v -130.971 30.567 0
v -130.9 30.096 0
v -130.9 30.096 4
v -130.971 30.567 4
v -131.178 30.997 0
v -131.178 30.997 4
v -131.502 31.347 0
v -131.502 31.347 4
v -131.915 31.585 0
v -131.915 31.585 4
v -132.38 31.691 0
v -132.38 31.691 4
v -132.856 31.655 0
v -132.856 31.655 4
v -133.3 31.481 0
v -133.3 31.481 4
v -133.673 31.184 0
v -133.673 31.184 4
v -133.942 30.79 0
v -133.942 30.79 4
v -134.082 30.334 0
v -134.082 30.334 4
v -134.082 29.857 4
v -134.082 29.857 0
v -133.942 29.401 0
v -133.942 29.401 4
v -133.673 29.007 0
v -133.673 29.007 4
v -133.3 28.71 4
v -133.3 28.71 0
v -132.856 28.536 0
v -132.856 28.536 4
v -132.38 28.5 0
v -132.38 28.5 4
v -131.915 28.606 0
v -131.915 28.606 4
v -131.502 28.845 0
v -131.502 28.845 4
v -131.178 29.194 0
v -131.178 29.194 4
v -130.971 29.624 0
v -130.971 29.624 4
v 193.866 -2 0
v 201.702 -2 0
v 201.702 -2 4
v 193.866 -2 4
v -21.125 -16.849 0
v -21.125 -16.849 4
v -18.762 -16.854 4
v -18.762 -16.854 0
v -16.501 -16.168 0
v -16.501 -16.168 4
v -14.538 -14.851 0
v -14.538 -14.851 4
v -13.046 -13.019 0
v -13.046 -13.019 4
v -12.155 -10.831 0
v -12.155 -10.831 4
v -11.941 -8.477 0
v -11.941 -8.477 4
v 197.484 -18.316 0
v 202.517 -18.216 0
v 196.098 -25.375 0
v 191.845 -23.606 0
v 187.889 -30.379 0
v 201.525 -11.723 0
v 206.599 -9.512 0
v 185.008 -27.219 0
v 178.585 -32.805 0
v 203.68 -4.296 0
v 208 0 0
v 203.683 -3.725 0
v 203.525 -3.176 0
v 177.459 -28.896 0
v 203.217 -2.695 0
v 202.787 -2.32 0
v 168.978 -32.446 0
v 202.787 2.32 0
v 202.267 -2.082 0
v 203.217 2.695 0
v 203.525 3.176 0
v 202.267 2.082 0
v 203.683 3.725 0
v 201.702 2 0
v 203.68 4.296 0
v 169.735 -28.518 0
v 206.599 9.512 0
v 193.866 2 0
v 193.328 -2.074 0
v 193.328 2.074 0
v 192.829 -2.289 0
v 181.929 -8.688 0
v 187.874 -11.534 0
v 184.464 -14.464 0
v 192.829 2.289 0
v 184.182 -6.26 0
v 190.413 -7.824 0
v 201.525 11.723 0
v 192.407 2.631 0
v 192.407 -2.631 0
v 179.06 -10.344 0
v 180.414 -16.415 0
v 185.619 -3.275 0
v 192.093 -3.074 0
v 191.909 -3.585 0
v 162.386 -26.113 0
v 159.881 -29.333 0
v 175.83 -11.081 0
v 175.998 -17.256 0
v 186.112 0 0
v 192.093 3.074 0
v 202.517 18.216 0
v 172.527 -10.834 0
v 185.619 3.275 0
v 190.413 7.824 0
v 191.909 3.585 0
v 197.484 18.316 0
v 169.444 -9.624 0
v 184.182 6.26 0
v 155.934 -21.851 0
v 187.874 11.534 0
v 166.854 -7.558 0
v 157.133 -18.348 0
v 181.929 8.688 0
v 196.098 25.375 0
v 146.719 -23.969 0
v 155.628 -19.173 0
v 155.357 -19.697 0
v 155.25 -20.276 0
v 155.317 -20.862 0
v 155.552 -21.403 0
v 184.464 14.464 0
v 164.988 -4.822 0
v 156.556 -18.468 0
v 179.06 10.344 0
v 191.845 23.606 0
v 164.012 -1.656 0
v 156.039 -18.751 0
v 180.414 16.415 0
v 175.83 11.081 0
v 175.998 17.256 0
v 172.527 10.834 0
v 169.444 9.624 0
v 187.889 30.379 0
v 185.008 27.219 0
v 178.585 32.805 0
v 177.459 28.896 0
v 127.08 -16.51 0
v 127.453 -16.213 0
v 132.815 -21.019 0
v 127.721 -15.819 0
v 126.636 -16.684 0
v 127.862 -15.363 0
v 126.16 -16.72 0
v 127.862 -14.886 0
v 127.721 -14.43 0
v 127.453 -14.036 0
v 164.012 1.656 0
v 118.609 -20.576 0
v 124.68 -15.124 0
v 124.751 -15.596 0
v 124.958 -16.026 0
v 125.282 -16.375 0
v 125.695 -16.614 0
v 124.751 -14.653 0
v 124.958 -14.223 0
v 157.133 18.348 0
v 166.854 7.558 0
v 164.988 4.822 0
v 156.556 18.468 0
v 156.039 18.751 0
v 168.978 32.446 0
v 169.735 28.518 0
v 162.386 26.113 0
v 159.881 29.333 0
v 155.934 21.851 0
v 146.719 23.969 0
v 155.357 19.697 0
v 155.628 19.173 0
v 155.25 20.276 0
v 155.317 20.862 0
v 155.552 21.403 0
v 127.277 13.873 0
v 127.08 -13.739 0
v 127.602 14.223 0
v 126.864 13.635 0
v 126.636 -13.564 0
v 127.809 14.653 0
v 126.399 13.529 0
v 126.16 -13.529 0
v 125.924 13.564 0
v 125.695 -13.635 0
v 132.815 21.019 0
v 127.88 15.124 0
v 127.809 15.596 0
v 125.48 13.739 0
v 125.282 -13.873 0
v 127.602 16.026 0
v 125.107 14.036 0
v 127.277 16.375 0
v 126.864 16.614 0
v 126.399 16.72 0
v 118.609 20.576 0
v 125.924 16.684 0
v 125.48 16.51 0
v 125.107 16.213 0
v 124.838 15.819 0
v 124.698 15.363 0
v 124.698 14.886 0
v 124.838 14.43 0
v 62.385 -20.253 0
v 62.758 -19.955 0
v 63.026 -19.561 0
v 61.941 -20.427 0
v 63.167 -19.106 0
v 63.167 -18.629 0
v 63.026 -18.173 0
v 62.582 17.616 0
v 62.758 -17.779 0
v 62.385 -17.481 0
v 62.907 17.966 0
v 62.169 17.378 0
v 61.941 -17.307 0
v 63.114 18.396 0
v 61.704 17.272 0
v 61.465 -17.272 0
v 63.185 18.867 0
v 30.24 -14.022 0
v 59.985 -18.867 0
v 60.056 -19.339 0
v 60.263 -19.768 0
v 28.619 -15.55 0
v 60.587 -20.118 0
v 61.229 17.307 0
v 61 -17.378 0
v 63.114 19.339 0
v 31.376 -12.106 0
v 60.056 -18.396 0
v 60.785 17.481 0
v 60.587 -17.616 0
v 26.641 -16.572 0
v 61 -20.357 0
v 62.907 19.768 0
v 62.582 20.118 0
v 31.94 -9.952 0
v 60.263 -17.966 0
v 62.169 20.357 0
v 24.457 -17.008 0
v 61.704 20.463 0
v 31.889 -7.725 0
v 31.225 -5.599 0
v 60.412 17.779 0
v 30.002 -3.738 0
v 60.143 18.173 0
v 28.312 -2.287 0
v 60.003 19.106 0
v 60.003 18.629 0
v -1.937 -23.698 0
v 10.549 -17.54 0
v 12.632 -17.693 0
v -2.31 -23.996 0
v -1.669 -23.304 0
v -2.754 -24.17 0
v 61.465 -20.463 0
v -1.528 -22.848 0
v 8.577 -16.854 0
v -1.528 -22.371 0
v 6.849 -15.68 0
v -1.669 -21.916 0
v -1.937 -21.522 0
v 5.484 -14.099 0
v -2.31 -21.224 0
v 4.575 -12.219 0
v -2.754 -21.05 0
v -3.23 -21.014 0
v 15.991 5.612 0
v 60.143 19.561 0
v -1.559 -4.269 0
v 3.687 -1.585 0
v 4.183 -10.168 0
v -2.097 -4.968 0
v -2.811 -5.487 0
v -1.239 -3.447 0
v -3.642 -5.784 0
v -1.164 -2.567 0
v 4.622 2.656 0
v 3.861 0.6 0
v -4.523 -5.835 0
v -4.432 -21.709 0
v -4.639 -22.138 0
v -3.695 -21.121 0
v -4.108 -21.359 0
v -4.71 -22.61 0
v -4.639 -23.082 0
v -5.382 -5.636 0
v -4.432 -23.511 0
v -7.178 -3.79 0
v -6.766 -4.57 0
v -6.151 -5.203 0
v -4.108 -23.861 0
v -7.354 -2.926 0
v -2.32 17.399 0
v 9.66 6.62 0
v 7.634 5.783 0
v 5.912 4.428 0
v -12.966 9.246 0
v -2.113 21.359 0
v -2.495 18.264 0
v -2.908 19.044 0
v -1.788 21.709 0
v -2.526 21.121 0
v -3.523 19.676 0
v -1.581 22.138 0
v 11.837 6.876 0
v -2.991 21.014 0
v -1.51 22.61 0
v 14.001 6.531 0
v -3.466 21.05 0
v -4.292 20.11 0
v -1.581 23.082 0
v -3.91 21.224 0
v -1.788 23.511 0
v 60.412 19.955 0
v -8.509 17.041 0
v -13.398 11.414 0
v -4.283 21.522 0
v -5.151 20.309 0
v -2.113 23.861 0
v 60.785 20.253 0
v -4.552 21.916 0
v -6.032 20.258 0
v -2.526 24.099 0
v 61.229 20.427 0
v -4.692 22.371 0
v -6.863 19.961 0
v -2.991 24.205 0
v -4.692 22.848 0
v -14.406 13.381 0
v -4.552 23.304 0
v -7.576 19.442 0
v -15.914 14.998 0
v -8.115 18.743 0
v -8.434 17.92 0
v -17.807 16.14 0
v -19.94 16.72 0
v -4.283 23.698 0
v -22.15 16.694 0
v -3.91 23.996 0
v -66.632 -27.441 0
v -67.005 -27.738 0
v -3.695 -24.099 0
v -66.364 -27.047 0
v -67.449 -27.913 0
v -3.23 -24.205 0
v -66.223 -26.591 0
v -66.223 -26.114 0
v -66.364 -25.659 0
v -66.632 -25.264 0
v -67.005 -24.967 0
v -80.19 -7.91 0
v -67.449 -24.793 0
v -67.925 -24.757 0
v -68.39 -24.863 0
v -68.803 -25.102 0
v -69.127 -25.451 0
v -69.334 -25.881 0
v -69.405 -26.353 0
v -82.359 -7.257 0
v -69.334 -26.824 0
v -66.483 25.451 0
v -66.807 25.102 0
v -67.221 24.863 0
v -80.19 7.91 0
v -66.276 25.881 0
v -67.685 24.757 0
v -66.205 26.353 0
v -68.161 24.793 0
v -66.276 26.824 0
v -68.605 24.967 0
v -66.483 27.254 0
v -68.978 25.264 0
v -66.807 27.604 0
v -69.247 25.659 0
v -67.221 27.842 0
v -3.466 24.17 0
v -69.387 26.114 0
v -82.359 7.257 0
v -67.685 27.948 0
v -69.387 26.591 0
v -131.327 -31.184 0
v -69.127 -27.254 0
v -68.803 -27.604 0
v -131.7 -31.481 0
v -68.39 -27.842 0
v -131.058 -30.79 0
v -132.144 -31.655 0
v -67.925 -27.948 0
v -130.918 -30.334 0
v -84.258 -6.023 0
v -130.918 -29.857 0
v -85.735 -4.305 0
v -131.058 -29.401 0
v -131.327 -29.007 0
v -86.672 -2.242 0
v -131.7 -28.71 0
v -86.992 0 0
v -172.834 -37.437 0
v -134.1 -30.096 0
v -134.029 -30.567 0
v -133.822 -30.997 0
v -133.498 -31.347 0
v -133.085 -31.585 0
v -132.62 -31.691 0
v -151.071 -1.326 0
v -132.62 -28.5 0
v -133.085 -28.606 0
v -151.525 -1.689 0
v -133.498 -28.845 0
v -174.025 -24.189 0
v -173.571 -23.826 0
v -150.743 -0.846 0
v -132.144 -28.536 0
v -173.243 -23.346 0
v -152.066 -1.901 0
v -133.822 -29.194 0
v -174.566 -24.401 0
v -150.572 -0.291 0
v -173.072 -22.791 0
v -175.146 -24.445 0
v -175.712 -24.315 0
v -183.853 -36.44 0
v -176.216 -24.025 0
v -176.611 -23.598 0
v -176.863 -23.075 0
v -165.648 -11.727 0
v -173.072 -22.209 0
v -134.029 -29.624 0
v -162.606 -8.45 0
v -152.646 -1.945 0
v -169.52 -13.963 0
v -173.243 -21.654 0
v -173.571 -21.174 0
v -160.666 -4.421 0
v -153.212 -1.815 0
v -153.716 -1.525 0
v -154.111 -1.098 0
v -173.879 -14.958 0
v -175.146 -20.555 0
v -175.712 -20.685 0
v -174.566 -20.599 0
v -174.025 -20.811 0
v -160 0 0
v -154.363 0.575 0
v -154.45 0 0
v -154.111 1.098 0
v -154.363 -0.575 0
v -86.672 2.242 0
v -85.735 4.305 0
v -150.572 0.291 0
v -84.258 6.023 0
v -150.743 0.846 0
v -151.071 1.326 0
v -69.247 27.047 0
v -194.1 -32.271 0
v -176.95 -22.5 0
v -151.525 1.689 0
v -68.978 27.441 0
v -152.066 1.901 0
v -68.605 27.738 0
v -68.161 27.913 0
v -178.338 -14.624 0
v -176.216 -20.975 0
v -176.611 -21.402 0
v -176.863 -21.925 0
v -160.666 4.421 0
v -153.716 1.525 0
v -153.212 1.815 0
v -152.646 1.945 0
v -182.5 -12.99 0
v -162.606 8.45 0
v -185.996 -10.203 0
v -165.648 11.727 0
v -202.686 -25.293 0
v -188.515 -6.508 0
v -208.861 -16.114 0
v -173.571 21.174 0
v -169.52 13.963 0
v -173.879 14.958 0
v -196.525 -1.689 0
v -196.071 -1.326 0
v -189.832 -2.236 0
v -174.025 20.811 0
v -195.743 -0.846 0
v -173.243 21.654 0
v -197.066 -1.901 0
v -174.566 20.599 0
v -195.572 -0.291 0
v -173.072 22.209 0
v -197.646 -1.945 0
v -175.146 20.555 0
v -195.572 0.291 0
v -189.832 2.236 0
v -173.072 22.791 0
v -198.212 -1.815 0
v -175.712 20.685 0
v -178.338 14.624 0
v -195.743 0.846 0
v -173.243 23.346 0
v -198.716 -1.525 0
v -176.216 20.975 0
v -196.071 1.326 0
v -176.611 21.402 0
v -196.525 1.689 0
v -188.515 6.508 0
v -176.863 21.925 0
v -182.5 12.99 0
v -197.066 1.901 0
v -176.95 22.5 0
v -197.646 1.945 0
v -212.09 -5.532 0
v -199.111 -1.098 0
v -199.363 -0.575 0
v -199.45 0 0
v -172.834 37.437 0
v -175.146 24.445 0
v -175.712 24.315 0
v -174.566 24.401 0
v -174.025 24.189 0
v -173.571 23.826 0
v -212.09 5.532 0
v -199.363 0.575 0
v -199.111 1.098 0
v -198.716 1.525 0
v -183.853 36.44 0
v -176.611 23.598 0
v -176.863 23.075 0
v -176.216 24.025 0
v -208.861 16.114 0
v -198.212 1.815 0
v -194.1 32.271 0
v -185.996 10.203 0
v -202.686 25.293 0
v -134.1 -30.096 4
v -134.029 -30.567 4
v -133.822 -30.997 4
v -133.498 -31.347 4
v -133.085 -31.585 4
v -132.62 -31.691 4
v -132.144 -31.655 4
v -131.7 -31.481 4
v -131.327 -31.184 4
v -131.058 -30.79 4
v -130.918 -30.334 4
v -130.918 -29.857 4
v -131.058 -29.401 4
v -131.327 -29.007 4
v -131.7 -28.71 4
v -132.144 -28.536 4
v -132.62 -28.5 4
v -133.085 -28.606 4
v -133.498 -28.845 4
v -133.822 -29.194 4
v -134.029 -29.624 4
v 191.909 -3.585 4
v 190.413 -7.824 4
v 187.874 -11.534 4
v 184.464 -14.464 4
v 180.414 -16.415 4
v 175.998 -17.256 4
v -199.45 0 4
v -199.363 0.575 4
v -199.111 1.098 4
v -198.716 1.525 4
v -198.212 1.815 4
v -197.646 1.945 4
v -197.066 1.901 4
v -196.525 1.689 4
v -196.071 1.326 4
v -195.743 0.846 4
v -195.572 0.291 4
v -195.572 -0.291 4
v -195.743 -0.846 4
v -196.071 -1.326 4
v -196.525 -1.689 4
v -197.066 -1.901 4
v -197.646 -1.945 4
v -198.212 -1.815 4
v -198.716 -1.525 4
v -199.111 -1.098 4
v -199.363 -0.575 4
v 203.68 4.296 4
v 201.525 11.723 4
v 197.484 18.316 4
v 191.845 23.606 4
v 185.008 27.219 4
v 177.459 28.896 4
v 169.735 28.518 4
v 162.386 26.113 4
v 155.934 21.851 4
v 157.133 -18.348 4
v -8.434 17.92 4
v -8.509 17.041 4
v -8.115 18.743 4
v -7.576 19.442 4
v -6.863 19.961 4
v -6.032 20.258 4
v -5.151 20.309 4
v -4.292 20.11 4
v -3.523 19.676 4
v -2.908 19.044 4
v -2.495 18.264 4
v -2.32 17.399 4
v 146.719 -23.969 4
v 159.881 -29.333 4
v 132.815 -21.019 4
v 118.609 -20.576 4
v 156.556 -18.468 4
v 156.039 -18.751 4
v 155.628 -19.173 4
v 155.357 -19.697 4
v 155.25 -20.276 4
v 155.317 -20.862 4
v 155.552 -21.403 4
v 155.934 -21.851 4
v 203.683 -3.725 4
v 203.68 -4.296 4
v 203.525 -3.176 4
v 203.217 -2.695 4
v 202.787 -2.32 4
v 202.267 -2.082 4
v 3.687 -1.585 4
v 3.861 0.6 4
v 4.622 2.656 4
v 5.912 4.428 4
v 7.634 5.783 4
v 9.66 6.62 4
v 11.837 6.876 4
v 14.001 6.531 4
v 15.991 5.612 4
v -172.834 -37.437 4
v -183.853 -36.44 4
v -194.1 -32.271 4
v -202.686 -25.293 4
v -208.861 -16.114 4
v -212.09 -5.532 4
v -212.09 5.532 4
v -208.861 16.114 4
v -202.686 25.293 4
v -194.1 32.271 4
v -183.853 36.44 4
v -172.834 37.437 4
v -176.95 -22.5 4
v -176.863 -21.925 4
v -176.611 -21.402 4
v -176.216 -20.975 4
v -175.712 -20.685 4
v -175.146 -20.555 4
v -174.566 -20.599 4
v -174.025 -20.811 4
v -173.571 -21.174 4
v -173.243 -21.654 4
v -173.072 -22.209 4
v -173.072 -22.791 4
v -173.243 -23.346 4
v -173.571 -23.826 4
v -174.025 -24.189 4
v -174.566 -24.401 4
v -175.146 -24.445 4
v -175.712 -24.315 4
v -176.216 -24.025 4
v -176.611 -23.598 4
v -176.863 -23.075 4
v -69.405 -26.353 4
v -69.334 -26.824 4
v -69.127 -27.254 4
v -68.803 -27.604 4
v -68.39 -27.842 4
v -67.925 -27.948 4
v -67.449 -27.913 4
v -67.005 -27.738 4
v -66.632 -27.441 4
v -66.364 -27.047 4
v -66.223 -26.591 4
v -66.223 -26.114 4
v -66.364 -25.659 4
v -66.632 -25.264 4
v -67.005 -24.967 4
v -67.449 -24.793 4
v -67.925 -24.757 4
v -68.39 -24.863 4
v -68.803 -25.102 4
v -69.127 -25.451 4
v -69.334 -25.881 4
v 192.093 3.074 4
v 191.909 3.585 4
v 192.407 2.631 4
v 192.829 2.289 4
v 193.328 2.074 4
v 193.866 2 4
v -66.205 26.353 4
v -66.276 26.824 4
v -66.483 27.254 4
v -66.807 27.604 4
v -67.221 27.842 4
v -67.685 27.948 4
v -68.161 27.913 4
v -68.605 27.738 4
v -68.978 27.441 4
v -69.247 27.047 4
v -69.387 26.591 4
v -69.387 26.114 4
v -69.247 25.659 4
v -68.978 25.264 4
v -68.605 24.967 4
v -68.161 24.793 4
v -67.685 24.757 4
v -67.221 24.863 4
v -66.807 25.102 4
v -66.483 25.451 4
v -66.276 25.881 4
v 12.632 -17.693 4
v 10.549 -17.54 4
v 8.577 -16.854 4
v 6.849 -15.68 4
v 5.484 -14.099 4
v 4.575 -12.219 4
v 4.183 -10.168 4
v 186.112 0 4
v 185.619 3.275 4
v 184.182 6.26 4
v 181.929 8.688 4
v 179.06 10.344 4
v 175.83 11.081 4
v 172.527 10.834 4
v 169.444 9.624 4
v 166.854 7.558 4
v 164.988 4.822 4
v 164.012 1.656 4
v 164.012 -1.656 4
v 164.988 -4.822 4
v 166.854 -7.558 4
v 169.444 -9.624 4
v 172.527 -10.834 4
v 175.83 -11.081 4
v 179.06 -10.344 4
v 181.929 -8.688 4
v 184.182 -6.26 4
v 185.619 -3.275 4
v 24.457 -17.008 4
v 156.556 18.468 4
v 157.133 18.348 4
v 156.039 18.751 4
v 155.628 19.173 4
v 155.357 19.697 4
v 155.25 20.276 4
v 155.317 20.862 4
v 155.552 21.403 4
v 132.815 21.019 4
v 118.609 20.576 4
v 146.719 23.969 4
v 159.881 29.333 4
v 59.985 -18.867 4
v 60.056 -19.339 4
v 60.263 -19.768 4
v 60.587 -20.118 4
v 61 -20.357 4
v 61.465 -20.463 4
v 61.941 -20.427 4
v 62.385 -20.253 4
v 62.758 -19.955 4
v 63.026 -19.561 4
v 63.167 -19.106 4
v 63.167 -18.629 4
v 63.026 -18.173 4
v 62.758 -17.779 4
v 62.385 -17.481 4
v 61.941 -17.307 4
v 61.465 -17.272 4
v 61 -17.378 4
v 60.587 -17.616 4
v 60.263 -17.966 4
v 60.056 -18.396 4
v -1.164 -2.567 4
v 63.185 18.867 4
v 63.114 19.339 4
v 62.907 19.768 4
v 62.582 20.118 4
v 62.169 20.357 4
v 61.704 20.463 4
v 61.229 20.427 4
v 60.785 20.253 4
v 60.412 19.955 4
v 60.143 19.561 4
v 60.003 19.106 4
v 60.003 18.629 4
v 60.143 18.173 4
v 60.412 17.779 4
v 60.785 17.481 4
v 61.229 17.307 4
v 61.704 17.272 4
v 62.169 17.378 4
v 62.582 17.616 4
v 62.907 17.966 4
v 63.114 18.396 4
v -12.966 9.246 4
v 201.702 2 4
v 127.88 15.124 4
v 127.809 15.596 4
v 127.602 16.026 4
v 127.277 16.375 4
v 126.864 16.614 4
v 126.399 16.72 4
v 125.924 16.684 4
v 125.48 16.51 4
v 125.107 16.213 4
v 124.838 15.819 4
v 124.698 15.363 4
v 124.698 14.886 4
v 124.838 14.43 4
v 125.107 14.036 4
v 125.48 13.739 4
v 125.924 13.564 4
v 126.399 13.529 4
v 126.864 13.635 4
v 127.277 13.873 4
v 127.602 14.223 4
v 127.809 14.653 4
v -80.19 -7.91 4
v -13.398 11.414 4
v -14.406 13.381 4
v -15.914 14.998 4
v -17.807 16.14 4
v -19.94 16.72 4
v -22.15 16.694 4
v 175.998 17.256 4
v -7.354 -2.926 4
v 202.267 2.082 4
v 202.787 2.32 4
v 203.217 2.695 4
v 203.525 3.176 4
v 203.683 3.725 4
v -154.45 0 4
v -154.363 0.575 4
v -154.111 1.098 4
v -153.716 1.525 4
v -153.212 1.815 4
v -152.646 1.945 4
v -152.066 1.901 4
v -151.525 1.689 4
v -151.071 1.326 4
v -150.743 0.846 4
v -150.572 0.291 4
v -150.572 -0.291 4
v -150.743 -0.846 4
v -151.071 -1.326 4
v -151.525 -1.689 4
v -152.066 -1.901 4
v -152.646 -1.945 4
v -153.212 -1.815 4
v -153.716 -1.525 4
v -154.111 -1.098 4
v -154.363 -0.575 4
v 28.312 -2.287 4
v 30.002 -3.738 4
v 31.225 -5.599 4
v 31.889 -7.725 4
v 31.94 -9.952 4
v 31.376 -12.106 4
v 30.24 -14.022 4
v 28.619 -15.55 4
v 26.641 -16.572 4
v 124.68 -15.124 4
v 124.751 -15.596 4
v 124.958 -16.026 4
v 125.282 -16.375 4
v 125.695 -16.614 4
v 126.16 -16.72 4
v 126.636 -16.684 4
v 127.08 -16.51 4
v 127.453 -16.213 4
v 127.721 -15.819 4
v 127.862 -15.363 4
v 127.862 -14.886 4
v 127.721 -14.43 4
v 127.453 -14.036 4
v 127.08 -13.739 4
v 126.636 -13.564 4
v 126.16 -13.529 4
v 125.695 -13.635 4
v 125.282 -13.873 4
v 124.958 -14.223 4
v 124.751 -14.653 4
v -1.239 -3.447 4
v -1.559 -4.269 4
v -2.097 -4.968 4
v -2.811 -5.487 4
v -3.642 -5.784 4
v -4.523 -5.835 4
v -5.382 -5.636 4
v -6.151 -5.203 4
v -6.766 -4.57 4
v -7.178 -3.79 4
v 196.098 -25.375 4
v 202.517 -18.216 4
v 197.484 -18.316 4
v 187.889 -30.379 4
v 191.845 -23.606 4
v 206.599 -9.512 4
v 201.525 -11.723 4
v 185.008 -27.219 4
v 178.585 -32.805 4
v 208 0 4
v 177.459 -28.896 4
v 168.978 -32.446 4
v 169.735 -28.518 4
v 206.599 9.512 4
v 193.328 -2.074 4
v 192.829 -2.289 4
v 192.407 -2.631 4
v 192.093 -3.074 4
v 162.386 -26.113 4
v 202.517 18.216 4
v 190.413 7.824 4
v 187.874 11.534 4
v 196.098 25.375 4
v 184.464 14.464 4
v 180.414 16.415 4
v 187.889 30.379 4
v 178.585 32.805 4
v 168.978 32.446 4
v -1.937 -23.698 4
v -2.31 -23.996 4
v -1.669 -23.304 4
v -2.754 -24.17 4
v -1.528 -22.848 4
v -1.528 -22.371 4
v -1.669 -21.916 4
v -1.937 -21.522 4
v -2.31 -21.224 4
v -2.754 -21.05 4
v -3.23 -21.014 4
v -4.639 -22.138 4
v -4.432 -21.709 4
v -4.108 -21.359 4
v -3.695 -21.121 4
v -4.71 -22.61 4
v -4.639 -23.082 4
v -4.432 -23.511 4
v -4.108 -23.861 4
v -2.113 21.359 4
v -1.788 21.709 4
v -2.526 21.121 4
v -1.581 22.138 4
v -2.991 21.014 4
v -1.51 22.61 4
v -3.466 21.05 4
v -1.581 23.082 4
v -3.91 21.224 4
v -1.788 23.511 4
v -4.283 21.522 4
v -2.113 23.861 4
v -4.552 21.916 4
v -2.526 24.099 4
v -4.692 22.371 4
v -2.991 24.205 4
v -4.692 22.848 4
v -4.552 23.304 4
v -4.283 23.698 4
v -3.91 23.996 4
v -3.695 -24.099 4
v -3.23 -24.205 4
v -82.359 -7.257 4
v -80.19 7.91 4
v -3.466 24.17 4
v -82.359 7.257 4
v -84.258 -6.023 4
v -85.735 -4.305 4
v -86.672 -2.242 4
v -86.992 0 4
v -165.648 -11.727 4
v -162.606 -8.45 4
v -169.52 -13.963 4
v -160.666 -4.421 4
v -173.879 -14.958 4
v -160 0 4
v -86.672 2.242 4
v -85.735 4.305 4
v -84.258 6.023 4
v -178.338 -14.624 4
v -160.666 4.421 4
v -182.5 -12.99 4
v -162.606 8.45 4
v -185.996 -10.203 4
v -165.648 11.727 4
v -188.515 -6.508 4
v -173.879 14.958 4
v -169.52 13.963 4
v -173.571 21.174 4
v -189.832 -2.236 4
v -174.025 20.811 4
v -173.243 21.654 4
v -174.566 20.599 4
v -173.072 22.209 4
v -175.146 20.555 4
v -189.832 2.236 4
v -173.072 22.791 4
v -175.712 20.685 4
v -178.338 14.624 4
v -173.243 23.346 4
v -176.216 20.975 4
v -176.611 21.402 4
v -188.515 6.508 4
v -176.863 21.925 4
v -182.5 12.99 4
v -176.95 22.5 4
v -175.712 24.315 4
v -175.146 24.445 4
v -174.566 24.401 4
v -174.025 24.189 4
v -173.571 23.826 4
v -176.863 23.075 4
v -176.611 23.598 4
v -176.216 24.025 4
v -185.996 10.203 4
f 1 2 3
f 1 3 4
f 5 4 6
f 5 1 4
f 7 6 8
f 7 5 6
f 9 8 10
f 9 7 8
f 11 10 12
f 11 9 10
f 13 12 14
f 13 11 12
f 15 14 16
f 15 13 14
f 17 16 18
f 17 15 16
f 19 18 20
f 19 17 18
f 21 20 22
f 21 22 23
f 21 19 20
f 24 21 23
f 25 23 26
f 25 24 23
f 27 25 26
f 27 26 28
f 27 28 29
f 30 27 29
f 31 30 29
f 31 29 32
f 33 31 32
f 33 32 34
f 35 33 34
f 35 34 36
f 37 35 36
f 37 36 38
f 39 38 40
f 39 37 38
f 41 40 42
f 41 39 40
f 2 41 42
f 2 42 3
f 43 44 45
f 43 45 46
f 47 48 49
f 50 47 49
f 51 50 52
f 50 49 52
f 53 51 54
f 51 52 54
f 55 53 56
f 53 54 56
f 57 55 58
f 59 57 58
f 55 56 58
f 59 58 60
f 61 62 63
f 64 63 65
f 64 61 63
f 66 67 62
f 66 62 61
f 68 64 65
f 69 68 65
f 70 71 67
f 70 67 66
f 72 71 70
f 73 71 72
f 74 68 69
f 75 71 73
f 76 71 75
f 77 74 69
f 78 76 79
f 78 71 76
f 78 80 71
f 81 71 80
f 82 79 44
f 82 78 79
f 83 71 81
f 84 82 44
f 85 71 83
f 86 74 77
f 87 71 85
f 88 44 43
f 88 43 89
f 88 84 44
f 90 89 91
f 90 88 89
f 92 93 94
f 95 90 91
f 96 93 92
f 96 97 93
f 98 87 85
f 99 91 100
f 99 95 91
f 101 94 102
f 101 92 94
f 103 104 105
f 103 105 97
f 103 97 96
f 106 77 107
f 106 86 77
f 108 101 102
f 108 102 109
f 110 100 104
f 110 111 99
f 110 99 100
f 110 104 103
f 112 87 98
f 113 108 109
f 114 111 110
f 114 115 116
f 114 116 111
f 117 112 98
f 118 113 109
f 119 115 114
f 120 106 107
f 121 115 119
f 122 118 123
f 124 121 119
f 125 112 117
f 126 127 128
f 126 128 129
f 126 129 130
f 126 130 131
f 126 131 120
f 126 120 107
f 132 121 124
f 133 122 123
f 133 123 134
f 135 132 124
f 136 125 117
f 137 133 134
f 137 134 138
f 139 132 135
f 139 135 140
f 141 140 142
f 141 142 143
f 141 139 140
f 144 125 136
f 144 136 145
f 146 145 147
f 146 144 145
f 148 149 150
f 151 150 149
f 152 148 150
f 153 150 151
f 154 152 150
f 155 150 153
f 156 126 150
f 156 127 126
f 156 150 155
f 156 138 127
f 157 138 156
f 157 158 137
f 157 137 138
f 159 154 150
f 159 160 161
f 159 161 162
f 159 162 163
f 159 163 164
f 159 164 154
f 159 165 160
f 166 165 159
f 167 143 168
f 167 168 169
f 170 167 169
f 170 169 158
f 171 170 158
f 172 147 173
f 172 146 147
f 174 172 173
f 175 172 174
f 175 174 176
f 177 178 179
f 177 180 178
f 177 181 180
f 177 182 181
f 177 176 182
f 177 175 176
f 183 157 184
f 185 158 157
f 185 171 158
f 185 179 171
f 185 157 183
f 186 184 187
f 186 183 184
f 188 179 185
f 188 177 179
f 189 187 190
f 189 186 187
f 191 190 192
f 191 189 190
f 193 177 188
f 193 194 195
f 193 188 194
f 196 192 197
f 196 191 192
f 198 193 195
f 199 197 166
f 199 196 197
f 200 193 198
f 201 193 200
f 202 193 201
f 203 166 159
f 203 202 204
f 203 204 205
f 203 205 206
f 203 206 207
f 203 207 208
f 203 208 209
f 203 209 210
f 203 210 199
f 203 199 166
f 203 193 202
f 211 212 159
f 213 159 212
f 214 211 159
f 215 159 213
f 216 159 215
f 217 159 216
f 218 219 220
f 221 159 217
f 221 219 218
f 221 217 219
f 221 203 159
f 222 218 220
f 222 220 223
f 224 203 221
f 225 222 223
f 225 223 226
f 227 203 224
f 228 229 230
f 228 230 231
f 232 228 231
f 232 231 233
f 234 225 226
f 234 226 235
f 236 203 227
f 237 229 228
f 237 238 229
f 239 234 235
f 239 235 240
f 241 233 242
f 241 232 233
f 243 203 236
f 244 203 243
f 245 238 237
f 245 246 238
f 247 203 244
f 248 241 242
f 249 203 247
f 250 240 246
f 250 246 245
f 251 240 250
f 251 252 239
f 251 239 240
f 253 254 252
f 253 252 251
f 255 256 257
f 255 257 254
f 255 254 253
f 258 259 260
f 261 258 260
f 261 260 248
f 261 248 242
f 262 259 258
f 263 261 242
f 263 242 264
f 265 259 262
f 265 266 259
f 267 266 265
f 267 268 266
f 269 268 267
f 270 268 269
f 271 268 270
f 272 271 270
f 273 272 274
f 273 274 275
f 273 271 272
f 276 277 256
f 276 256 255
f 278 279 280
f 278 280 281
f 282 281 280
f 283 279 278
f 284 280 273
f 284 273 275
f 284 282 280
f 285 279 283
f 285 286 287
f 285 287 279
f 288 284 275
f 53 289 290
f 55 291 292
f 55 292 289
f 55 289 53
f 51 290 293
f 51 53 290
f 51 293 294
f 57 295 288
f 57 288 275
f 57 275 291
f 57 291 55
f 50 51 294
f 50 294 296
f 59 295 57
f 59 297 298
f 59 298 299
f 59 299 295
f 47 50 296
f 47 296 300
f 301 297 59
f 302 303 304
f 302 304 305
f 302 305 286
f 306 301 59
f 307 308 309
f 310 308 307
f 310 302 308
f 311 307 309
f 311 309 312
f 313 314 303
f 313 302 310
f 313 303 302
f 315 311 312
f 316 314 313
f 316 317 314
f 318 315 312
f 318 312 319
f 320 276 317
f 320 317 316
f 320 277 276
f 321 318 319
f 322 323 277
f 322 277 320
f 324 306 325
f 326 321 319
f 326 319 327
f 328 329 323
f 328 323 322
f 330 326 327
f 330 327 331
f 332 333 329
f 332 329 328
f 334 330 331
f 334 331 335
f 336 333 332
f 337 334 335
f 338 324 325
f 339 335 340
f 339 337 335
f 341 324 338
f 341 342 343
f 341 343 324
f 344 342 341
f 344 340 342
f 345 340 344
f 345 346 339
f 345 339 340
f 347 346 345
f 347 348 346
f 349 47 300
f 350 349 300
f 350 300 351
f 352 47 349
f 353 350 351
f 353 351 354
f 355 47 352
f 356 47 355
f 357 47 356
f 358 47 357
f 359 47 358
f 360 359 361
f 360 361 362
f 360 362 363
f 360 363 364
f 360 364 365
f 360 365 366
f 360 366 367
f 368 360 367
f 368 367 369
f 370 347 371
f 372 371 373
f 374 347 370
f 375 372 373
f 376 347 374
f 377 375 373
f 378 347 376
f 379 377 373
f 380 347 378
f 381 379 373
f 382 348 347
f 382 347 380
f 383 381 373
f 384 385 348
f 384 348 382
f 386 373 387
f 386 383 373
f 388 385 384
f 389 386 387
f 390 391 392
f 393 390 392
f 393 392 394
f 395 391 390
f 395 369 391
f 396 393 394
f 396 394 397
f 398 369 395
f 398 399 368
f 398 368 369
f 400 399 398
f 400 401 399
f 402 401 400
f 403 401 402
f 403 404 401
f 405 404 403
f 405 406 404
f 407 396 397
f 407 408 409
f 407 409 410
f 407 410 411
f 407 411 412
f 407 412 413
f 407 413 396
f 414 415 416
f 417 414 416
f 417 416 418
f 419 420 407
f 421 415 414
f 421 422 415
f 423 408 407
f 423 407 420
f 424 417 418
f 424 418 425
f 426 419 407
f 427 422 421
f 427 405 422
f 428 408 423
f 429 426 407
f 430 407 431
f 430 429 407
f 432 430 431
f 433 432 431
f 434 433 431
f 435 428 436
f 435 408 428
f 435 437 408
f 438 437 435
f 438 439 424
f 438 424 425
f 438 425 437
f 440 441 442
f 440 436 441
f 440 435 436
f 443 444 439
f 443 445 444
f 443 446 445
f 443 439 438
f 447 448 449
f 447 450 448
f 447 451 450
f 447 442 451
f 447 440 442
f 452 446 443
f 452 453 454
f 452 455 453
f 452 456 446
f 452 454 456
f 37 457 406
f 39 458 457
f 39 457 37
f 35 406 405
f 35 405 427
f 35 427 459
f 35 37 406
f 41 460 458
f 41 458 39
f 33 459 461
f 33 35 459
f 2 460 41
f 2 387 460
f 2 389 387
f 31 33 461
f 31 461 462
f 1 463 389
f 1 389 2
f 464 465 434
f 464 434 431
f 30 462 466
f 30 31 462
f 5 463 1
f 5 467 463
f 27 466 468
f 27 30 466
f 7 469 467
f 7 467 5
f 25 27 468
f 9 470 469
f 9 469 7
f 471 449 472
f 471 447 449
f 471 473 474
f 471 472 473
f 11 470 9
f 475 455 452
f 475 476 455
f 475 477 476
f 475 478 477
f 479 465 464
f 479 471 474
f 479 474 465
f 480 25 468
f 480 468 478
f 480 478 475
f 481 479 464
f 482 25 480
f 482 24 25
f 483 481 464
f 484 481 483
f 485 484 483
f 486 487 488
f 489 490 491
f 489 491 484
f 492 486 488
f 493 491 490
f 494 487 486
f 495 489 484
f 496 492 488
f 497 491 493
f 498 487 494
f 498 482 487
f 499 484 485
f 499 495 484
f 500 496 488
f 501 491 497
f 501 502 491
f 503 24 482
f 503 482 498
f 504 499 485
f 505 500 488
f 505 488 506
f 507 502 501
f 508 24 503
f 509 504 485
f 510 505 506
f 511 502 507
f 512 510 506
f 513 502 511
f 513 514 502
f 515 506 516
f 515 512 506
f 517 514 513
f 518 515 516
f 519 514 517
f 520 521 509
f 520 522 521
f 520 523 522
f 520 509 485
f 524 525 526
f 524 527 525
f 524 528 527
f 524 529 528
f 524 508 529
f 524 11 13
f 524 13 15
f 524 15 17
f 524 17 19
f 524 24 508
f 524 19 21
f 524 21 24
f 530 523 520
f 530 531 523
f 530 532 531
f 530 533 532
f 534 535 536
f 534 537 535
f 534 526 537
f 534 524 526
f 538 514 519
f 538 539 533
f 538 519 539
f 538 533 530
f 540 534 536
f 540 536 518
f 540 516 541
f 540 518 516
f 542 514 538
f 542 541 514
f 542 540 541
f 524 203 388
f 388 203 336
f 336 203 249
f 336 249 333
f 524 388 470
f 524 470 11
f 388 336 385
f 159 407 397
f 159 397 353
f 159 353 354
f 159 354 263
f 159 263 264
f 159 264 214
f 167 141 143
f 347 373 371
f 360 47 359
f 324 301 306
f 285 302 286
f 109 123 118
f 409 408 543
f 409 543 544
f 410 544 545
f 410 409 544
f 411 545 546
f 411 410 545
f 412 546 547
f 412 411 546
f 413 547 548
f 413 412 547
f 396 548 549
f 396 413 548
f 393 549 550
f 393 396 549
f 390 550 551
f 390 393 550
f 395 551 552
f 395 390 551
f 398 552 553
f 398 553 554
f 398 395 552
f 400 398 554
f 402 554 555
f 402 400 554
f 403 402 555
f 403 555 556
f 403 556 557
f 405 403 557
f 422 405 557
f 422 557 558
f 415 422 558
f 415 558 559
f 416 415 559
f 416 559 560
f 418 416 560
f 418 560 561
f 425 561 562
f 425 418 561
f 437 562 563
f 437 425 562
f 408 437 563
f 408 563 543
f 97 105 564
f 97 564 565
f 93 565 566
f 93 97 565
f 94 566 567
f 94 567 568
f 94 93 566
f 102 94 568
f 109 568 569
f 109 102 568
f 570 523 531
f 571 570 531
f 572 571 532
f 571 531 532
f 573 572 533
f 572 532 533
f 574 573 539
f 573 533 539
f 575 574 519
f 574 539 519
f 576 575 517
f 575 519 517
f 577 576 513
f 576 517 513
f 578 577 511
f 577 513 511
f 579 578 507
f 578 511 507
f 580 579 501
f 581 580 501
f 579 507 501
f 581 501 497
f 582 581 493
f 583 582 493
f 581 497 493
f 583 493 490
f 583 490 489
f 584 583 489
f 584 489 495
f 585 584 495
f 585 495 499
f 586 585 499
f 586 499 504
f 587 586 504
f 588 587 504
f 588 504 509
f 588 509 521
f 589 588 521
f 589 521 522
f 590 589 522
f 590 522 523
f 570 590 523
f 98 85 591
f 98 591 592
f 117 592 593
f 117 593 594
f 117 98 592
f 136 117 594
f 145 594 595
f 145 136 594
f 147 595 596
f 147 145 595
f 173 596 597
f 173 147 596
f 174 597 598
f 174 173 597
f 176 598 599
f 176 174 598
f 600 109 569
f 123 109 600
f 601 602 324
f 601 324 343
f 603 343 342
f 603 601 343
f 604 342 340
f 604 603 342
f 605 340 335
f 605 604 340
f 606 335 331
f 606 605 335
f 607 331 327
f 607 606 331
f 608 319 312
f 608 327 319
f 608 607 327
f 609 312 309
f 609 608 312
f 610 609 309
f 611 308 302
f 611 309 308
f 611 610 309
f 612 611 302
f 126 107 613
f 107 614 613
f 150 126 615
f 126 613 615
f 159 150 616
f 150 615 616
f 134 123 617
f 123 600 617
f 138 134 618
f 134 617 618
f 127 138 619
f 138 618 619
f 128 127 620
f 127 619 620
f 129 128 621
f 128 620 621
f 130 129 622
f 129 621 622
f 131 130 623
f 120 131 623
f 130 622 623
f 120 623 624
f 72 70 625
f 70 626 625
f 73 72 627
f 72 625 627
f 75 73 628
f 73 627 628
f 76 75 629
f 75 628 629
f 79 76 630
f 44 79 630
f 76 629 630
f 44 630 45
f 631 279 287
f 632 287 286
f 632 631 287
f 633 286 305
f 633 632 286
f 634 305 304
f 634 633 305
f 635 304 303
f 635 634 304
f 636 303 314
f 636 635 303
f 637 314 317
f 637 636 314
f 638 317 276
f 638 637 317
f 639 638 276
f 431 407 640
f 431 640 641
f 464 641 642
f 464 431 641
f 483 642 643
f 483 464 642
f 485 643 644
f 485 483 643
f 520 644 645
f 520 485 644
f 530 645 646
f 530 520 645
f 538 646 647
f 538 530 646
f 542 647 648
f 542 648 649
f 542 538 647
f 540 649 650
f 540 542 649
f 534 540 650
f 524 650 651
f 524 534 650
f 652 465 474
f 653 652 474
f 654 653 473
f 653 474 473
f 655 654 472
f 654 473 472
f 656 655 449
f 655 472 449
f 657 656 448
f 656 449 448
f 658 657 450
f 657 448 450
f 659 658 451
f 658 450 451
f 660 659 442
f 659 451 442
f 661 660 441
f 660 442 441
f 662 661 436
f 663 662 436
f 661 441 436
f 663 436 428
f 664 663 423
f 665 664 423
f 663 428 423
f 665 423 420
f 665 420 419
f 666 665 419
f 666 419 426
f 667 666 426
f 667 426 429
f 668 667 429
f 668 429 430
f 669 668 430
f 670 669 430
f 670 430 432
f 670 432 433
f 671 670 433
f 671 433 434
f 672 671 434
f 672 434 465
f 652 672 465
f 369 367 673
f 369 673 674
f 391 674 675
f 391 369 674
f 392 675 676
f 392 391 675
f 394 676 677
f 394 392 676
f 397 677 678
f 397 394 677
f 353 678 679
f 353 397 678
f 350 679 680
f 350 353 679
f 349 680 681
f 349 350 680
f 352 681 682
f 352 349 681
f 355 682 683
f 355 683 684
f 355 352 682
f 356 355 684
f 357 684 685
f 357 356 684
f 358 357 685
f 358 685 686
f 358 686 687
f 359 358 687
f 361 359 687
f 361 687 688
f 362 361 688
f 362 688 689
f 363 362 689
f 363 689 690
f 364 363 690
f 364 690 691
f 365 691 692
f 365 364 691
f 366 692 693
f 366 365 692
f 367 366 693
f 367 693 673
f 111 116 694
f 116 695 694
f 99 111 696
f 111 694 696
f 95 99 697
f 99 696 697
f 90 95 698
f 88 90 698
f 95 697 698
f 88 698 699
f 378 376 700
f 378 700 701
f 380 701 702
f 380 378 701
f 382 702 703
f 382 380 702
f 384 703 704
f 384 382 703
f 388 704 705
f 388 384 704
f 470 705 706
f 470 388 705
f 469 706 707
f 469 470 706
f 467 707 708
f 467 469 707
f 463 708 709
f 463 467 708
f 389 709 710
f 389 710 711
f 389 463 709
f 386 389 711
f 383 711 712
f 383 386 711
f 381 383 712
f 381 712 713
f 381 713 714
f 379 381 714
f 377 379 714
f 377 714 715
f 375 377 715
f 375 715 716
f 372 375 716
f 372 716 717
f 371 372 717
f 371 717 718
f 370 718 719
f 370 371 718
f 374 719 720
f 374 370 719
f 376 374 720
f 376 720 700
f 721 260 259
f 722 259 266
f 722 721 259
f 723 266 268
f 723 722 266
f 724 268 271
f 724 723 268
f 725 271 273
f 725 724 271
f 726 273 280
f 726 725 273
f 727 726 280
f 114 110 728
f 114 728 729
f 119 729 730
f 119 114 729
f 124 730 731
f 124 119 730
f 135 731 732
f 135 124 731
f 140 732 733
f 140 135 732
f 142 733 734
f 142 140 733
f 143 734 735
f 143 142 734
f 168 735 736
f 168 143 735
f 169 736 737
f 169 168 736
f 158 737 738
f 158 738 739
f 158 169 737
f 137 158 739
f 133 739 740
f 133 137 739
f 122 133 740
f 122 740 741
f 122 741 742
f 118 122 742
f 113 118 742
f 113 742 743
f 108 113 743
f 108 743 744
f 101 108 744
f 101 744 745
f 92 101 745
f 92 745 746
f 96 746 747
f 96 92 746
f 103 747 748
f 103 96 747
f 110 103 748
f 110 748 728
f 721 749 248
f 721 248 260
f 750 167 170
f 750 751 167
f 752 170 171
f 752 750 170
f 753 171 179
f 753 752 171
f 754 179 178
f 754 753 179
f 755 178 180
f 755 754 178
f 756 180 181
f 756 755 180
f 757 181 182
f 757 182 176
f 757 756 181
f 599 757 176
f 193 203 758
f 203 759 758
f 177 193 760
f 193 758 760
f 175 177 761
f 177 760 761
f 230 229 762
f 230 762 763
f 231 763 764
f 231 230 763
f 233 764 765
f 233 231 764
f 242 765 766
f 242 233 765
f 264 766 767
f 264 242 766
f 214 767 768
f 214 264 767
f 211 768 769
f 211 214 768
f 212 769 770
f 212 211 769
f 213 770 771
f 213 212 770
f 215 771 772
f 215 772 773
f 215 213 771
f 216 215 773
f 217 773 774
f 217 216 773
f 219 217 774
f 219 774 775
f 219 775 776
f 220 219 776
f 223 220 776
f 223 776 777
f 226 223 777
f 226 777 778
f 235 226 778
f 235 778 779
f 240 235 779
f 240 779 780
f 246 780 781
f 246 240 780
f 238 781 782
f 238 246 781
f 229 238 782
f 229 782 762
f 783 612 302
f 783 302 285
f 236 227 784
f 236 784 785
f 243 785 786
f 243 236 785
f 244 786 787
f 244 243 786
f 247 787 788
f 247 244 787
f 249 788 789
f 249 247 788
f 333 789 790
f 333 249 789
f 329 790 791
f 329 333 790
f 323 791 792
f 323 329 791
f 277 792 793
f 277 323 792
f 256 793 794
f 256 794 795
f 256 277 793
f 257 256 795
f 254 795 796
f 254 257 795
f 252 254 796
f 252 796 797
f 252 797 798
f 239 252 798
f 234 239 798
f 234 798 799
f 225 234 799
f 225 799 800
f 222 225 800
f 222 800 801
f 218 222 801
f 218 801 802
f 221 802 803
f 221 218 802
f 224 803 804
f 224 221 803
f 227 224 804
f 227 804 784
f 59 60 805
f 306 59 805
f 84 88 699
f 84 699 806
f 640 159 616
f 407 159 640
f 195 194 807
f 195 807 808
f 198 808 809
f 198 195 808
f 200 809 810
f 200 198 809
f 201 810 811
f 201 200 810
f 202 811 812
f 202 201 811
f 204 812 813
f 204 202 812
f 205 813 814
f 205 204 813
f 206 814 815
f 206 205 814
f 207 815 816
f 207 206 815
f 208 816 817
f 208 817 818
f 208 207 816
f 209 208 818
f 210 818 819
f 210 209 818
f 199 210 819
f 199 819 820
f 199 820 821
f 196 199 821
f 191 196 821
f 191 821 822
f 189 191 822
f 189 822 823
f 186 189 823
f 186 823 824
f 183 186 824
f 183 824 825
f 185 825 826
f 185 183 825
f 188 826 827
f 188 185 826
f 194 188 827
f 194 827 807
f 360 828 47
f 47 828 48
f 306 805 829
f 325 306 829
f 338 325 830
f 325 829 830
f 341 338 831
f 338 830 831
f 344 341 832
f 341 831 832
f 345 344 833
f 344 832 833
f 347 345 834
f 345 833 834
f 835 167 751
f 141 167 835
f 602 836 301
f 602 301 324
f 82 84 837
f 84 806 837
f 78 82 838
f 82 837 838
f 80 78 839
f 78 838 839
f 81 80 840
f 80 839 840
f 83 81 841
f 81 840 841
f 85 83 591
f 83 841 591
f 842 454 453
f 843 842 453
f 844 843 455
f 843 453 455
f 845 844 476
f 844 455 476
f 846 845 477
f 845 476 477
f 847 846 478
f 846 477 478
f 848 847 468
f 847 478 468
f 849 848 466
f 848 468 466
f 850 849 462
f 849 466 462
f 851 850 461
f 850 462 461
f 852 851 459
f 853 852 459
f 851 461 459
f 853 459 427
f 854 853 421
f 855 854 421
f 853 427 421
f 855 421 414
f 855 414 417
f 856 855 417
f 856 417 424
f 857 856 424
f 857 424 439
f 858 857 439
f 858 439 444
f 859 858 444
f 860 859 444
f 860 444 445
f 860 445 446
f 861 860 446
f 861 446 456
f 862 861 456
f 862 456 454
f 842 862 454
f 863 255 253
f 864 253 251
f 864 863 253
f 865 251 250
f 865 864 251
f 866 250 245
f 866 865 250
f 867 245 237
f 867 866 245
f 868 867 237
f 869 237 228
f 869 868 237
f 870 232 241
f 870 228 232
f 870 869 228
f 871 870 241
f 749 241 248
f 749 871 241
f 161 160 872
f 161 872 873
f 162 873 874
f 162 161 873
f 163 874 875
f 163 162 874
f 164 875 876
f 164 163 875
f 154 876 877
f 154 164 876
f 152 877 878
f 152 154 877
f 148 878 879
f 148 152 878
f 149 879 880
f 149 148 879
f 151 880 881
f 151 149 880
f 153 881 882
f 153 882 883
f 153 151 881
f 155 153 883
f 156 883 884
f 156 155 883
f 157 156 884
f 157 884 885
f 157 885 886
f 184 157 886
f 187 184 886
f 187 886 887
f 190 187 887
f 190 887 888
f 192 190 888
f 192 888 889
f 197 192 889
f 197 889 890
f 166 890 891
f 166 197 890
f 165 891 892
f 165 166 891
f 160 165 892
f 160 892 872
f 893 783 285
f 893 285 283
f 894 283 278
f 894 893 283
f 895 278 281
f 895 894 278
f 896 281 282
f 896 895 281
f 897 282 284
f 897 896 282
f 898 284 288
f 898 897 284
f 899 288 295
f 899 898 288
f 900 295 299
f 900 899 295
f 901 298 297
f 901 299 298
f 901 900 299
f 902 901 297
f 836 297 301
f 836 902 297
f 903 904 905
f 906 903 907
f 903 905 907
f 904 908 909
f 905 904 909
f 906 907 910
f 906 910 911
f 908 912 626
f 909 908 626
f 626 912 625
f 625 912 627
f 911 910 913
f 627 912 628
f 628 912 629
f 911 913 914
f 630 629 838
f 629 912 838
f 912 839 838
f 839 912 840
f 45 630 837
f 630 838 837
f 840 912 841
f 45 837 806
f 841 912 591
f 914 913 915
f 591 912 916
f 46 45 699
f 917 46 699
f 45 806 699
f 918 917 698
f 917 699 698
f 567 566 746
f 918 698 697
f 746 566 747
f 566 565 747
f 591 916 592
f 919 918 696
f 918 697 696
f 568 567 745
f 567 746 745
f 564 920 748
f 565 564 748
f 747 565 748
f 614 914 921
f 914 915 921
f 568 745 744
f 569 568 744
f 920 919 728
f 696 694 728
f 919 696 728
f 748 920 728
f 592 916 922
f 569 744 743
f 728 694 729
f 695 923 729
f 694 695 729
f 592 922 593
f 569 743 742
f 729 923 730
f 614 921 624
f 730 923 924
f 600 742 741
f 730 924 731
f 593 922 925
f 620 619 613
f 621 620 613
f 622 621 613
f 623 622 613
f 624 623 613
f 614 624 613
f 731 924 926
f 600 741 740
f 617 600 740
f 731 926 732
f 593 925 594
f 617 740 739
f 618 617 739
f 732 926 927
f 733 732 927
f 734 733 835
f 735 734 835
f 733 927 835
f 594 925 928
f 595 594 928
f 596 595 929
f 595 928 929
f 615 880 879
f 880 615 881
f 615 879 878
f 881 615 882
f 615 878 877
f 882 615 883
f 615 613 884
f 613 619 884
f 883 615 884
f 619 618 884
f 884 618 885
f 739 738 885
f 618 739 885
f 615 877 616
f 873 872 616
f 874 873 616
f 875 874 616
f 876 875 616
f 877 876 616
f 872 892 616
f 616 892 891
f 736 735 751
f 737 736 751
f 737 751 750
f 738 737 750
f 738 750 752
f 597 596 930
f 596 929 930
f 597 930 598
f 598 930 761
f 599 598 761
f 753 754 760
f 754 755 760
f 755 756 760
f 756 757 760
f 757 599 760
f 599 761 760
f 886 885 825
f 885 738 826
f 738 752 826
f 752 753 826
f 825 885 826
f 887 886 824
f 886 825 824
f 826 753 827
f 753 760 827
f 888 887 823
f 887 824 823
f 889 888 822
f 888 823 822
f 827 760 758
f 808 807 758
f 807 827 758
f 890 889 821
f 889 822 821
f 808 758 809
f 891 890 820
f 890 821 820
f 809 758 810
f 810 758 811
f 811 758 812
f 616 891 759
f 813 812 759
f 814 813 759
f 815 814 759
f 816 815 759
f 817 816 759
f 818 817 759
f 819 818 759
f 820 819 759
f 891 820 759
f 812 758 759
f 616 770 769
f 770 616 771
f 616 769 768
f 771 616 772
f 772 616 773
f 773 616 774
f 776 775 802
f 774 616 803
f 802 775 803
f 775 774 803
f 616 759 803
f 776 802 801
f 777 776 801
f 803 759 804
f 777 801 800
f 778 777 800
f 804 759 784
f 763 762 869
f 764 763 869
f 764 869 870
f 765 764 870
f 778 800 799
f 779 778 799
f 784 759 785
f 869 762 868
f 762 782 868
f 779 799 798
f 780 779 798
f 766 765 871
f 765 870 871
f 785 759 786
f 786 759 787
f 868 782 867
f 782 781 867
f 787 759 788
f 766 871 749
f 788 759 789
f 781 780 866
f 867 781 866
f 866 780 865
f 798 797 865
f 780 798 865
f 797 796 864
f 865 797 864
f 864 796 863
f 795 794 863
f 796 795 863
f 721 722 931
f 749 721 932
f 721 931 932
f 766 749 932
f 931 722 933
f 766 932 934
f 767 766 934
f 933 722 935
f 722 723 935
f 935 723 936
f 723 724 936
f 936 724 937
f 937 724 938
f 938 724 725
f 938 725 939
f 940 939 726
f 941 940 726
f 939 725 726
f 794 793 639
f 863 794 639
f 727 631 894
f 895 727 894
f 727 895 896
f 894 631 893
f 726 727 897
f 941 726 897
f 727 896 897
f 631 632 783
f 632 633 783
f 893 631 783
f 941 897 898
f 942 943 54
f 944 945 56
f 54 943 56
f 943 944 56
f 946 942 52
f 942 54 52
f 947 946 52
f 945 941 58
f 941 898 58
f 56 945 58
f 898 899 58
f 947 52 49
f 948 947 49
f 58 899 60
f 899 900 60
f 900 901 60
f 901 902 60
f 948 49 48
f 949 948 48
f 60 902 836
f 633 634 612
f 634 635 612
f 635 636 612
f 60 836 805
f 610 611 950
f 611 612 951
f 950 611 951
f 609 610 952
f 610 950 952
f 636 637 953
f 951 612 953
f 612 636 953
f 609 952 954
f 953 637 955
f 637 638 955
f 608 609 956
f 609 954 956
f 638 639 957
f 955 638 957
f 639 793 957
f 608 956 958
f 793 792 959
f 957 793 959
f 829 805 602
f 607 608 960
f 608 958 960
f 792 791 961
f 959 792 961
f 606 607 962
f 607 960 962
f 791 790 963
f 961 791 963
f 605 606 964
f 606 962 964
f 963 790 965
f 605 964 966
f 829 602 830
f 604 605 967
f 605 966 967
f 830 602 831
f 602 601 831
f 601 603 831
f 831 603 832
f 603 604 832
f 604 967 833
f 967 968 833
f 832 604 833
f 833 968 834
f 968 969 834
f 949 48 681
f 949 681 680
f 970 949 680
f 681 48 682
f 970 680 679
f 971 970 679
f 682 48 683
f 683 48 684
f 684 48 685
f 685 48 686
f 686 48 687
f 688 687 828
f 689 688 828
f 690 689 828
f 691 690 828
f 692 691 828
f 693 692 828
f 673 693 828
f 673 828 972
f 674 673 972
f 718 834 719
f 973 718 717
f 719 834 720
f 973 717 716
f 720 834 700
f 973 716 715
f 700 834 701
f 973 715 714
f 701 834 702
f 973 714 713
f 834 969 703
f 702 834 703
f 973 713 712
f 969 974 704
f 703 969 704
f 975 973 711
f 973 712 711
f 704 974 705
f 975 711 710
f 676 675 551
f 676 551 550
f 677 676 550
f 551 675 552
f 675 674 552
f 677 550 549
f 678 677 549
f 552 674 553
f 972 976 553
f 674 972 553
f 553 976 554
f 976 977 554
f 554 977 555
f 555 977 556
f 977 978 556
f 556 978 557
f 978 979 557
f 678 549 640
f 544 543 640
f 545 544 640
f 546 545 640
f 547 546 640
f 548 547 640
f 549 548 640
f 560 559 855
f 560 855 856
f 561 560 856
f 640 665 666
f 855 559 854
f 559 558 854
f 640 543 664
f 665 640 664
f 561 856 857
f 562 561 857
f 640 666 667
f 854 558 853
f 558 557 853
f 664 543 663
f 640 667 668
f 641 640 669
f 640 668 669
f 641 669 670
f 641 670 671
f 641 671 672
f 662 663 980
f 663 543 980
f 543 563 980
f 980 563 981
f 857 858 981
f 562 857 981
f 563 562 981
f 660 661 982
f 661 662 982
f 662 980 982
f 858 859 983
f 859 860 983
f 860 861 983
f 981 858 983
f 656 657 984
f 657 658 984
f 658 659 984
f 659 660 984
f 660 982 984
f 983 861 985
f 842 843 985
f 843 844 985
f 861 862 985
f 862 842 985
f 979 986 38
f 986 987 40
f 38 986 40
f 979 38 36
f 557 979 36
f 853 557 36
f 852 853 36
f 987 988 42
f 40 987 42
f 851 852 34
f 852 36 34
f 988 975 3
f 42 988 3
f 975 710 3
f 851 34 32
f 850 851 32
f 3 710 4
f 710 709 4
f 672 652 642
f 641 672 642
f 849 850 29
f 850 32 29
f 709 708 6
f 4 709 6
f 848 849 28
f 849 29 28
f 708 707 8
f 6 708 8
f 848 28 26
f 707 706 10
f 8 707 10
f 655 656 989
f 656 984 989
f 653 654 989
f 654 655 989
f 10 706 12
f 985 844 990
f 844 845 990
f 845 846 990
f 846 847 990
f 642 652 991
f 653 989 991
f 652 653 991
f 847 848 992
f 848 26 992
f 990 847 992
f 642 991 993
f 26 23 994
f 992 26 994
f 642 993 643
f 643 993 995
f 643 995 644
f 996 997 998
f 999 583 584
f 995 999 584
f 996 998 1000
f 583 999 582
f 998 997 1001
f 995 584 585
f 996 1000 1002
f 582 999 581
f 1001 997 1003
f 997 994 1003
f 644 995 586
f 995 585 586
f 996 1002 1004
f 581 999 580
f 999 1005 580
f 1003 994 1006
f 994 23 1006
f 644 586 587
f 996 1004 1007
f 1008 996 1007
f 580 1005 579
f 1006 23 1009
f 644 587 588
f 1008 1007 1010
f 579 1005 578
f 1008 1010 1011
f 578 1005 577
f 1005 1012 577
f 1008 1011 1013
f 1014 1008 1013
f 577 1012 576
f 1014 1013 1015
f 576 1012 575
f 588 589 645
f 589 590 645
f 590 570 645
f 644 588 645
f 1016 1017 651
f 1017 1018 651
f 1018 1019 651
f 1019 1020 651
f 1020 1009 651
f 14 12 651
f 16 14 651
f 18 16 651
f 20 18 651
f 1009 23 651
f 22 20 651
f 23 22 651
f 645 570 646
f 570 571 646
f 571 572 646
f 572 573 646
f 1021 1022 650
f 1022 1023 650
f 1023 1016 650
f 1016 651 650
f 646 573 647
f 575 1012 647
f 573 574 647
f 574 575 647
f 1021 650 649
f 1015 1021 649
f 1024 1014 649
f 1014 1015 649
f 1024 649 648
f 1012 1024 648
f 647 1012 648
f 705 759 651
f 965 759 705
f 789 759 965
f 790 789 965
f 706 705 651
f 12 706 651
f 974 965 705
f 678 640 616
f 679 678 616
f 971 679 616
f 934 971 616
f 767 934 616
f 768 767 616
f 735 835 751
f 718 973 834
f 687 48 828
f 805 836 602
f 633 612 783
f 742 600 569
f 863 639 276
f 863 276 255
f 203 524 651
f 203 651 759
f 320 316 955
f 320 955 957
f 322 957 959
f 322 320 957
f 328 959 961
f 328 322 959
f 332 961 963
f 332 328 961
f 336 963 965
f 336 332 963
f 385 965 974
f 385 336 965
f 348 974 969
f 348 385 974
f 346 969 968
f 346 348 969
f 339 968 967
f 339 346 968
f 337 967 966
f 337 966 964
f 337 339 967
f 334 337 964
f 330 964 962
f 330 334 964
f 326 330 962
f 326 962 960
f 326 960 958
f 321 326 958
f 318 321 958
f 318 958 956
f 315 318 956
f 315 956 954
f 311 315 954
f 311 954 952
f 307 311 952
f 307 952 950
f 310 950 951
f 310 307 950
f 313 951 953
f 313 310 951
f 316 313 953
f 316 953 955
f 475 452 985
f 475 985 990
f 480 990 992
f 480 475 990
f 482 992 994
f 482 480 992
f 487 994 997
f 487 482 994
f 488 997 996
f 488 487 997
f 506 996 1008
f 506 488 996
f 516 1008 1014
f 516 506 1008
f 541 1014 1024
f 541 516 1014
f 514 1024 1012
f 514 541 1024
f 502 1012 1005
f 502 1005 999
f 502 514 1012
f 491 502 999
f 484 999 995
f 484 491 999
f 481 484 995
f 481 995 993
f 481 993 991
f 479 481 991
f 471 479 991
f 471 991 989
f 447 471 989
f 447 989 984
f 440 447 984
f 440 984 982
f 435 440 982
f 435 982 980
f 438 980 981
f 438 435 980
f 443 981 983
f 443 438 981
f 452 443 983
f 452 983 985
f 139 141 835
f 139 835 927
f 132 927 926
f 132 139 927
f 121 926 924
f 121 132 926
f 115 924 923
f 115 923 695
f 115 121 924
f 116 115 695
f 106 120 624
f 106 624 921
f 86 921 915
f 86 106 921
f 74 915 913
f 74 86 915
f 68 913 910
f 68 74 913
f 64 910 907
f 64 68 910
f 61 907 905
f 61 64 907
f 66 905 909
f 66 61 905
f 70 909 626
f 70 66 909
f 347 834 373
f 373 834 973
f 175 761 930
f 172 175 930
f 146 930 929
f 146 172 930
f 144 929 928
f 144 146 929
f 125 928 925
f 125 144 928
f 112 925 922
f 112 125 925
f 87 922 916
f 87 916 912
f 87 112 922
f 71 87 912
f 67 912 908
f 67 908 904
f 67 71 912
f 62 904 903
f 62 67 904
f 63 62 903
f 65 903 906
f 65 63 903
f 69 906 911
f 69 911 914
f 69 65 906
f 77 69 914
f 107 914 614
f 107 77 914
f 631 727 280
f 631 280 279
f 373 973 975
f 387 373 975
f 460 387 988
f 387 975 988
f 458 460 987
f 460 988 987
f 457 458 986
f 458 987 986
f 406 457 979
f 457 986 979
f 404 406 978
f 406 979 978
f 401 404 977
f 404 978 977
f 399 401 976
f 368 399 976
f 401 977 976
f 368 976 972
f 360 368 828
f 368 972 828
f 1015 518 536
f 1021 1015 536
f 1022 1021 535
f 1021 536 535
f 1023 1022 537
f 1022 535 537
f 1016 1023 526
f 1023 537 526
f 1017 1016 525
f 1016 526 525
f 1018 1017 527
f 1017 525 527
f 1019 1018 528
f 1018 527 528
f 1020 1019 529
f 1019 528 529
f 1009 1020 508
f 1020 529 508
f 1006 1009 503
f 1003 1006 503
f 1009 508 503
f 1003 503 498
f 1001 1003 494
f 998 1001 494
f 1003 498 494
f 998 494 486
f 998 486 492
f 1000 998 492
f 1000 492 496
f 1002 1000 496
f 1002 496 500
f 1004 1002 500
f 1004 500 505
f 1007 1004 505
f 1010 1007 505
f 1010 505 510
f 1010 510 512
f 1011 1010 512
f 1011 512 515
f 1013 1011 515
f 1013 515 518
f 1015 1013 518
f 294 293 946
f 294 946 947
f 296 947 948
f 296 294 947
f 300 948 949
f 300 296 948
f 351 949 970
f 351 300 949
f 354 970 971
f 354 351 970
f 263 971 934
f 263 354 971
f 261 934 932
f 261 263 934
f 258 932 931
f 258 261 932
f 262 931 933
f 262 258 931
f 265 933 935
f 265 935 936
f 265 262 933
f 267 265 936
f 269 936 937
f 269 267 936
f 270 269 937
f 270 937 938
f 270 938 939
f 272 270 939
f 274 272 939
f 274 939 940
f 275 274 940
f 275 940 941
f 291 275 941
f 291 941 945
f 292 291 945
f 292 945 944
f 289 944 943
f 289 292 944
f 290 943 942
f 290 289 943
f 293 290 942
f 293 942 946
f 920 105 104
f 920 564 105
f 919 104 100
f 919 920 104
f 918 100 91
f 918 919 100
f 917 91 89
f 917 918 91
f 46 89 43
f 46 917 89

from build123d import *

# Parameters (mm, degrees)
SKETCH1_R              = 11.1125
SKETCH1_R_2            = 15
SKETCH1_R_3            = 1.6
BOSS_EXTRUDE1_DEPTH    = 4
M3_5_CLEARANCE_HOLE1_D = 3.9
CUT_EXTRUDE1_DEPTH     = 10
BOSS_EXTRUDE2_START    = -4
BOSS_EXTRUDE2_DEPTH    = 4
FILLET1_R              = 2
FILLET2_R              = 80


with BuildPart() as part:
    # Sketch1 → Boss-Extrude1 (new body)
    with BuildSketch(Plane.XY):
        with BuildLine():
            Line((-172.834121622, 37.437400696), (175.998333346, 17.256280804))
            ThreePointArc((175.998333346, 17.256280804), (192.285135135, 0), (175.998333346, -17.256280804))
            Line((175.998333346, -17.256280804), (-172.834121622, -37.437400696))
            ThreePointArc((-172.834121622, -37.437400696), (-212.5, 0), (-172.834121622, 37.437400696))
        make_face()
        with Locations((175, 0)):
            Circle(SKETCH1_R, mode=Mode.SUBTRACT)
        with Locations((-175, 0)):
            Circle(SKETCH1_R_2, mode=Mode.SUBTRACT)
        with Locations((-132.5, 30.095576829)):
            Circle(SKETCH1_R_3, mode=Mode.SUBTRACT)
        with Locations((-67.805059302, 26.352758935)):
            Circle(SKETCH1_R_3, mode=Mode.SUBTRACT)
        with Locations((-3.110118604, 22.60994104)):
            Circle(SKETCH1_R_3, mode=Mode.SUBTRACT)
        with Locations((61.584822094, 18.867123146)):
            Circle(SKETCH1_R_3, mode=Mode.SUBTRACT)
        with Locations((126.279762792, 15.124305251)):
            Circle(SKETCH1_R_3, mode=Mode.SUBTRACT)
        with Locations(Location((126.279762792, -15.124305251, 0), (0, 0, 180))):
            Circle(SKETCH1_R_3, mode=Mode.SUBTRACT)
        with Locations(Location((61.584822094, -18.867123146, 0), (0, 0, 180))):
            Circle(SKETCH1_R_3, mode=Mode.SUBTRACT)
        with Locations(Location((-3.110118604, -22.60994104, 0), (0, 0, 180))):
            Circle(SKETCH1_R_3, mode=Mode.SUBTRACT)
        with Locations(Location((-67.805059302, -26.352758935, 0), (0, 0, 180))):
            Circle(SKETCH1_R_3, mode=Mode.SUBTRACT)
        with Locations(Location((-132.5, -30.095576829, 0), (0, 0, 180))):
            Circle(SKETCH1_R_3, mode=Mode.SUBTRACT)
    extrude(amount=BOSS_EXTRUDE1_DEPTH)

    # M3.5 Clearance Hole1 (through all)
    with Locations(Plane.XY.offset(4)):
        with Locations((-197.5, 0), (-175, 22.5), (-152.5, 0), (-175, -22.5)):
            Hole(M3_5_CLEARANCE_HOLE1_D / 2)

    # Sketch7 → Cut-Extrude1 (cut)
    with BuildSketch(Plane.XY.offset(4)):
        with BuildLine():
            Line((15.991284585, 5.612221232), (28.312344657, -2.287027054))
            ThreePointArc((28.312344657, -2.287027054), (31.73354052, -11.048707916), (24.456630921, -17.008424298))
            Line((24.456630921, -17.008424298), (12.632145333, -17.692510191))
            ThreePointArc((12.632145333, -17.692510191), (6.849401654, -15.679997443), (4.183445797, -10.167918763))
            Line((4.183445797, -10.167918763), (3.686871313, -1.584584585))
            ThreePointArc((3.686871313, -1.584584585), (7.634498428, 5.782998459), (15.991284585, 5.612221232))
        make_face()
        with BuildLine():
            Line((-11.941116444, -8.477289375), (-12.966479952, 9.246210209))
            ThreePointArc((-12.966479952, 9.246210209), (-15.914080917, 14.997692214), (-22.150280177, 16.694075277))
            Line((-22.150280177, 16.694075277), (-80.189531309, 7.909919122))
            ThreePointArc((-80.189531309, 7.909919122), (-86.992376567, 0), (-80.189531309, -7.909919122))
            Line((-80.189531309, -7.909919122), (-21.124916668, -16.849262551))
            ThreePointArc((-21.124916668, -16.849262551), (-14.538255469, -14.851468272), (-11.941116444, -8.477289375))
        make_face()
        with BuildLine():
            Line((-7.35411028, -2.925540775), (-8.509245415, 17.04107293))
            ThreePointArc((-8.509245415, 17.04107293), (-5.593466237, 20.314944), (-2.319595167, 17.399164822))
            Line((-2.319595167, 17.399164822), (-1.164460032, -2.567448883))
            ThreePointArc((-1.164460032, -2.567448883), (-4.08023921, -5.841319953), (-7.35411028, -2.925540775))
        make_face()
    extrude(amount=-CUT_EXTRUDE1_DEPTH, mode=Mode.SUBTRACT)

    # Sketch9 → Boss-Extrude2 (add)
    with BuildSketch(Plane.XY.offset(4).offset(BOSS_EXTRUDE2_START)):
        with BuildLine():
            Line((192.169038897, 2), (203.930952283, 2))
            ThreePointArc((203.930952283, 2), (183.947829075, 27.585074857), (152.751498531, 18.60118766))
            Line((152.751498531, 18.60118766), (147.934334346, 18.87987666))
            ThreePointArc((147.934334346, 18.87987666), (208, 0), (147.934334346, -18.87987666))
            Line((147.934334346, -18.87987666), (152.751498531, -18.60118766))
            ThreePointArc((152.751498531, -18.60118766), (183.947829075, -27.585074857), (203.930952283, -2))
            Line((203.930952283, -2), (192.169038897, -2))
            ThreePointArc((192.169038897, -2), (192.285135135, 0), (192.169038897, 2))
        make_face()
    extrude(amount=BOSS_EXTRUDE2_DEPTH)

    # Fillet1
    fillet1_edges = [part.edges().sort_by_distance(p)[0] for p in [
        (192.169038897, 2, 2),
        (192.169038897, -2, 2),
        (203.930952283, -2, 2),
        (152.751498531, -18.60118766, 2),
        (152.751498531, 18.60118766, 2),
        (203.930952283, 2, 2),
    ]]
    fillet(fillet1_edges, radius=FILLET1_R)

    # Fillet2
    fillet2_edges = [part.edges().sort_by_distance(p)[0] for p in [
        (147.934334346, -18.87987666, 2),
        (147.934334346, 18.87987666, 2),
    ]]
    fillet(fillet2_edges, radius=FILLET2_R)


solid = part.part
